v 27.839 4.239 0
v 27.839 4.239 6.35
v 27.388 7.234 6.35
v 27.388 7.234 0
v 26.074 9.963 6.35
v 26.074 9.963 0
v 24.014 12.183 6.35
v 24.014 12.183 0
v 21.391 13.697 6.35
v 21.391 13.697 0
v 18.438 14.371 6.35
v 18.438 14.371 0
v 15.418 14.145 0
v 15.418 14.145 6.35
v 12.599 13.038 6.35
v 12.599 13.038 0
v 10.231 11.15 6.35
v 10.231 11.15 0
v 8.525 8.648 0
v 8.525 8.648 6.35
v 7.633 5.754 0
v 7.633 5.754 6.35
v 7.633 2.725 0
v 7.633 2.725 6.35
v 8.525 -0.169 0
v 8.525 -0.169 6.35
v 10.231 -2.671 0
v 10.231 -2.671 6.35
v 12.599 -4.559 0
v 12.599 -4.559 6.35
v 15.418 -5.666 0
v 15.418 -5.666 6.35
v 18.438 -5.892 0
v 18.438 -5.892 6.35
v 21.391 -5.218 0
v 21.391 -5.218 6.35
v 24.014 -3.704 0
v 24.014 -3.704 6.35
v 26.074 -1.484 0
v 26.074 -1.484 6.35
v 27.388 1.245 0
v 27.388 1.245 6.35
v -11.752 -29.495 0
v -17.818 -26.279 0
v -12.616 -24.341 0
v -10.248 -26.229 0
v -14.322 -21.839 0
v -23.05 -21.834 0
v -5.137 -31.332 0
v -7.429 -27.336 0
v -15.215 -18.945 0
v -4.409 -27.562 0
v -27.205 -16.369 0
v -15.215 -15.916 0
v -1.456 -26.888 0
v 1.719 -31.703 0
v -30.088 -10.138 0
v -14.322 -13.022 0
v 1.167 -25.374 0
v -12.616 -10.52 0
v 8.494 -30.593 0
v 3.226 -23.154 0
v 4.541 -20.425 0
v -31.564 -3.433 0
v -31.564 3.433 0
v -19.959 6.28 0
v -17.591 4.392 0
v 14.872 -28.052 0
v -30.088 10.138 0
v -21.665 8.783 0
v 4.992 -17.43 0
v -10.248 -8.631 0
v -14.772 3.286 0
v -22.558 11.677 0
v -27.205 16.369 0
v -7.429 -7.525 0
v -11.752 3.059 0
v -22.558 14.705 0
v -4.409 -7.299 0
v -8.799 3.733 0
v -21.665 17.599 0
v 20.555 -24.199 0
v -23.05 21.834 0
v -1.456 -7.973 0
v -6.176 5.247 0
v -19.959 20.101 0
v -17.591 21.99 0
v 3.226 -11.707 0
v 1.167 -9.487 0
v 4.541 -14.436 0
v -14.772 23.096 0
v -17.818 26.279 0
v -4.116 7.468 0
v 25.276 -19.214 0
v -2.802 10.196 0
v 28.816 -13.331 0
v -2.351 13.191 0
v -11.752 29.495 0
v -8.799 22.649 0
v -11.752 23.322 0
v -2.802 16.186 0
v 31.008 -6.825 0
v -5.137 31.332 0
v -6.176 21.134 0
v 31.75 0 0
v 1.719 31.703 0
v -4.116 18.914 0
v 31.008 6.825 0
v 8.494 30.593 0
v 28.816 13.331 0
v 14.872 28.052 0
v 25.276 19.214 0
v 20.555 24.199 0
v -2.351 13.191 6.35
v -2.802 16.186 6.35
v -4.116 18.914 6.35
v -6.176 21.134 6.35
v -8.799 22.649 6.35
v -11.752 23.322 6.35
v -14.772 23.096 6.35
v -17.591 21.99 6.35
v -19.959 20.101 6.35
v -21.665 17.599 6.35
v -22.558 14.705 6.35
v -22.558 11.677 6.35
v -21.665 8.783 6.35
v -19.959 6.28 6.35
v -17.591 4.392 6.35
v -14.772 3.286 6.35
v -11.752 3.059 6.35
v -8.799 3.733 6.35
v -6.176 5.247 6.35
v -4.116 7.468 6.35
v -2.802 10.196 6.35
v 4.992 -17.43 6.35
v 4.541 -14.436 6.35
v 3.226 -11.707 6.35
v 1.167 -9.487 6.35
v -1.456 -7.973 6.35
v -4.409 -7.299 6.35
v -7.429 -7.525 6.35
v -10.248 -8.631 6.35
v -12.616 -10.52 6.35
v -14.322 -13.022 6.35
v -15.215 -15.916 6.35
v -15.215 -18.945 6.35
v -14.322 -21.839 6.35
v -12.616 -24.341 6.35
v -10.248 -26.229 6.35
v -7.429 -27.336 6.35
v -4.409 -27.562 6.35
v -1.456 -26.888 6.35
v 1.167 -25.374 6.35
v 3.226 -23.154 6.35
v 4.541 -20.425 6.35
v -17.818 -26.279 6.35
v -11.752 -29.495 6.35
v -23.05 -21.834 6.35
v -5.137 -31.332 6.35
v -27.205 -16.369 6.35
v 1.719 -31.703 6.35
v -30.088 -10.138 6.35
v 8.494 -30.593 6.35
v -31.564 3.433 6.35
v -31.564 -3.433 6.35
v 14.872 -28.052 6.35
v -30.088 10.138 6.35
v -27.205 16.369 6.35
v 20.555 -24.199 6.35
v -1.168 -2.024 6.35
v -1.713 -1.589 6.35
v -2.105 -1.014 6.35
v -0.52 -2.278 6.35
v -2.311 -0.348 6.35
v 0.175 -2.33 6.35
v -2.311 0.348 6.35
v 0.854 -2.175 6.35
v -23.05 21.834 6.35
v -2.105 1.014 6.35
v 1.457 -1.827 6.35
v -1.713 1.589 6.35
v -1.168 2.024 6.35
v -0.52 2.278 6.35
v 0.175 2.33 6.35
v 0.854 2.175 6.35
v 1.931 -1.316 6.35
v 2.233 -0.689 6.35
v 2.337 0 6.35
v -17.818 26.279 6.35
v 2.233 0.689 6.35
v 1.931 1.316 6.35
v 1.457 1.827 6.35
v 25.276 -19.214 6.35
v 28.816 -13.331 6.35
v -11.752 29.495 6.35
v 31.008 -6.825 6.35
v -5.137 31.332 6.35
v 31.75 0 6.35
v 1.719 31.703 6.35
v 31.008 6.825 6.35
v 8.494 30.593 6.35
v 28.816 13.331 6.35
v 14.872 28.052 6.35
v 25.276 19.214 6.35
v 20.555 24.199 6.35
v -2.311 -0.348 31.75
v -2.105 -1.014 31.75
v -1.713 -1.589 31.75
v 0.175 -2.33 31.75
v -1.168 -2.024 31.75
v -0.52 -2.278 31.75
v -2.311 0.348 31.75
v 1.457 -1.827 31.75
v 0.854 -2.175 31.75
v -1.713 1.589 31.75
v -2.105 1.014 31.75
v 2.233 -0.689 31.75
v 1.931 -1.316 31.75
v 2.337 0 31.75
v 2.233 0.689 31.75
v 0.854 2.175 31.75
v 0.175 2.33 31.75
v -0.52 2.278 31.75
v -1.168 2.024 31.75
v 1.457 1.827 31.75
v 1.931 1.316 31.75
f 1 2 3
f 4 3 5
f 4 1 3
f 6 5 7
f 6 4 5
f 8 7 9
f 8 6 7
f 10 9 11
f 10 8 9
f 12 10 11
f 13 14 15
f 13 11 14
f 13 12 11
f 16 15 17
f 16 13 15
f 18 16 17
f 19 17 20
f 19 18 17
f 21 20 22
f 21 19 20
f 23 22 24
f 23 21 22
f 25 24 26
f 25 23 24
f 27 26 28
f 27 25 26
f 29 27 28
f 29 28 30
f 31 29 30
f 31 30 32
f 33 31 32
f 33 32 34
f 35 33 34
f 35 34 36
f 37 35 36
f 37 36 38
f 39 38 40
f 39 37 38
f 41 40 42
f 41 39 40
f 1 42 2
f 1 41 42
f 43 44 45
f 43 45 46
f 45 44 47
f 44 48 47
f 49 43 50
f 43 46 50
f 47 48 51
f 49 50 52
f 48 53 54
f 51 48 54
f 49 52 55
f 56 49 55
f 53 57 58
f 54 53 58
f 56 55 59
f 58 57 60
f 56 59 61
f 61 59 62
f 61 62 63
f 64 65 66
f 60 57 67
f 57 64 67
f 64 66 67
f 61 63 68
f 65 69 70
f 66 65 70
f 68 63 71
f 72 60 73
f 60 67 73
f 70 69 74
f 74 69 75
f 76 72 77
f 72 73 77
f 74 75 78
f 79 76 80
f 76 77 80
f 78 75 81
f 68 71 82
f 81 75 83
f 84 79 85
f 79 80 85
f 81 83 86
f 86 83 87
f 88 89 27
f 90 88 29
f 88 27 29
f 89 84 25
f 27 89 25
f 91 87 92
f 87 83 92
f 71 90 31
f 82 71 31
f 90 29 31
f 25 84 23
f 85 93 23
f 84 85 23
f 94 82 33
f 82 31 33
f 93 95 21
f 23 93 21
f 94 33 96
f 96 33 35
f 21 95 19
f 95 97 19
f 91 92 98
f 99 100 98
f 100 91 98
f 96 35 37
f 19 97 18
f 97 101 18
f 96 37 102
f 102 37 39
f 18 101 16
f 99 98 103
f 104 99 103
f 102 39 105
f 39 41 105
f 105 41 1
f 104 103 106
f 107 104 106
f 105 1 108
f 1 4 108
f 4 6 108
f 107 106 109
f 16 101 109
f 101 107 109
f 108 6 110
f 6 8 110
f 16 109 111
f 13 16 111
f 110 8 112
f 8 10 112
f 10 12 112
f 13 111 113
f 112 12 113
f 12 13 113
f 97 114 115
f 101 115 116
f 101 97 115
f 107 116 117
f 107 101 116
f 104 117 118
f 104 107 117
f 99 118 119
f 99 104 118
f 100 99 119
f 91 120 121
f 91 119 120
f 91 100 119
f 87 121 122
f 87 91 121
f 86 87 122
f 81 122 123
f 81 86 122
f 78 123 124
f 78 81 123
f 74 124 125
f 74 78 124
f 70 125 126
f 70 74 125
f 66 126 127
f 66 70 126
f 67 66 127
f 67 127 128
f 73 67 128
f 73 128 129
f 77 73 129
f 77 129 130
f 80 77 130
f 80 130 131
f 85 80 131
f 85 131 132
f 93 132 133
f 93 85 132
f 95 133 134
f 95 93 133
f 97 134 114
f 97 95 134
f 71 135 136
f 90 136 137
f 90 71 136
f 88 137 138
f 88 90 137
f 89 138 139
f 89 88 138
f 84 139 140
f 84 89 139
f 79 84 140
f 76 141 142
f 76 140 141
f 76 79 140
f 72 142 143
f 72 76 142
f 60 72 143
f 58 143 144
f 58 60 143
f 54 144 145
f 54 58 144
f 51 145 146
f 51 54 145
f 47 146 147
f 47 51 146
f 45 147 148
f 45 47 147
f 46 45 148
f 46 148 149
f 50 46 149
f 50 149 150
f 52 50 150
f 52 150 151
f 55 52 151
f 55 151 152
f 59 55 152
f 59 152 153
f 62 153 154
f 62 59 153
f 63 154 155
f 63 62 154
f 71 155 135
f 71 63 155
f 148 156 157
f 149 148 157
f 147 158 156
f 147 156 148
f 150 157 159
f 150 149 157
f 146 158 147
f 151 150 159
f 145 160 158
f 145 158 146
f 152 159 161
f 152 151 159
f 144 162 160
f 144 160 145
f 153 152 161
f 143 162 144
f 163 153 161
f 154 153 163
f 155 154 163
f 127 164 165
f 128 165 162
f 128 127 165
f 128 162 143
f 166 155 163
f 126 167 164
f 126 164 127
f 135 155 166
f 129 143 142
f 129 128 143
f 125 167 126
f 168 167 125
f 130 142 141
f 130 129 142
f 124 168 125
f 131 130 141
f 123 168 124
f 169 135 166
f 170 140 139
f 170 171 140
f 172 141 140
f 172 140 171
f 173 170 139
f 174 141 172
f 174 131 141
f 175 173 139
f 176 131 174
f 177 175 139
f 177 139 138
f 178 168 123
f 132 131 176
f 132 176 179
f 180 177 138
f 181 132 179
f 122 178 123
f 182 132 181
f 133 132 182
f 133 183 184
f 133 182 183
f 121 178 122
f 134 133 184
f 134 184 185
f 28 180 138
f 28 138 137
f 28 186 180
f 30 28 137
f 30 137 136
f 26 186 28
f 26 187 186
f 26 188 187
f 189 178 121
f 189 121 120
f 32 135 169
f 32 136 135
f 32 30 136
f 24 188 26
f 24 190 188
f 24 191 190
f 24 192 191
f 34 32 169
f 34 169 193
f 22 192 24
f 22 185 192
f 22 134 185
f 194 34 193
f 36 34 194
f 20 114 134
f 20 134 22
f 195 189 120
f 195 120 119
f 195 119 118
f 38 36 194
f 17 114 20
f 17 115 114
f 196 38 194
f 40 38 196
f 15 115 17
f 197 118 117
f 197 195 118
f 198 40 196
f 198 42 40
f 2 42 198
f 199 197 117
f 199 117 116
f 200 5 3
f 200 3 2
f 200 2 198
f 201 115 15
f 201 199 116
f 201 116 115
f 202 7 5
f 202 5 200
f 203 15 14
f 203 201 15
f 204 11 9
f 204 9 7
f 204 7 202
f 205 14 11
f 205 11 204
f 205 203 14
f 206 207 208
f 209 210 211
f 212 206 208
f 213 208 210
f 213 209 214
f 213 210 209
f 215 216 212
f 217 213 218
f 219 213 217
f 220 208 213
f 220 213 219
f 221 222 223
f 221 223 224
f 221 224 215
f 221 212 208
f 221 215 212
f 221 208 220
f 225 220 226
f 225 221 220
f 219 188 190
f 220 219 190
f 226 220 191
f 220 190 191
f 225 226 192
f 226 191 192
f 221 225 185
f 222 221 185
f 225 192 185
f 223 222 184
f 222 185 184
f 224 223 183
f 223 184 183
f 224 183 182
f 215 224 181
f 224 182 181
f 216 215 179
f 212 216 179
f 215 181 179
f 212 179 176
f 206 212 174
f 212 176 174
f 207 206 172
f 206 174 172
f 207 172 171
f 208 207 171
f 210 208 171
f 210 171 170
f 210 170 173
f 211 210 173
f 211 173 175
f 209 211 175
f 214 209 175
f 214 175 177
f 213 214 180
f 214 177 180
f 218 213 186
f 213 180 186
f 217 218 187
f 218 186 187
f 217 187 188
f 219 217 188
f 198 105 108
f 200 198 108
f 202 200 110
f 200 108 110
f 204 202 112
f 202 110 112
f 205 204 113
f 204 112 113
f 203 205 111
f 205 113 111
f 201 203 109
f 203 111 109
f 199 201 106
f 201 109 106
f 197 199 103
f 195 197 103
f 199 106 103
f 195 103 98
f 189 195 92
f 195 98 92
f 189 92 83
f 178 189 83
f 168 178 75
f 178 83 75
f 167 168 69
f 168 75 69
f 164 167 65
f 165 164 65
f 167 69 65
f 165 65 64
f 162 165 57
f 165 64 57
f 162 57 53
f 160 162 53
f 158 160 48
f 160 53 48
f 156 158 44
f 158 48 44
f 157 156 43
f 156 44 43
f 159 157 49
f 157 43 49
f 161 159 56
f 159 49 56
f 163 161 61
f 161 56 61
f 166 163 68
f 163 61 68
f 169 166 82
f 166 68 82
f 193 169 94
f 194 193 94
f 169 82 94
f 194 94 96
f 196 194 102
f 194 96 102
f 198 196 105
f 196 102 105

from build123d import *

# Parameters (mm, degrees)
F0_R     = 31.75
F2_DEPTH = 6.35
F1_R     = 10.16
F3_DEPTH = 25.4
F4_R     = 2.336661
F5_DEPTH = 25.4


with BuildPart() as f2:
    # F0 (on Top) → F2 (new body)
    with BuildSketch(Plane.XY):
        Circle(F0_R)
    extrude(amount=F2_DEPTH)

    # F1 (on face) → F3 (cut)
    with BuildSketch(Plane.XY):
        with Locations((-5.168118, -17.430304)):
            Circle(F1_R)
        with Locations((17.679145, 4.23943)):
            Circle(F1_R)
        with Locations((-12.511027, 13.190874)):
            Circle(F1_R)
    extrude(amount=F3_DEPTH, mode=Mode.SUBTRACT)

    # F4 (on face) → F5 (join)
    with BuildSketch(Plane.XY.offset(6.35)):
        Circle(F4_R)
    extrude(amount=F5_DEPTH)


solid = f2.part
